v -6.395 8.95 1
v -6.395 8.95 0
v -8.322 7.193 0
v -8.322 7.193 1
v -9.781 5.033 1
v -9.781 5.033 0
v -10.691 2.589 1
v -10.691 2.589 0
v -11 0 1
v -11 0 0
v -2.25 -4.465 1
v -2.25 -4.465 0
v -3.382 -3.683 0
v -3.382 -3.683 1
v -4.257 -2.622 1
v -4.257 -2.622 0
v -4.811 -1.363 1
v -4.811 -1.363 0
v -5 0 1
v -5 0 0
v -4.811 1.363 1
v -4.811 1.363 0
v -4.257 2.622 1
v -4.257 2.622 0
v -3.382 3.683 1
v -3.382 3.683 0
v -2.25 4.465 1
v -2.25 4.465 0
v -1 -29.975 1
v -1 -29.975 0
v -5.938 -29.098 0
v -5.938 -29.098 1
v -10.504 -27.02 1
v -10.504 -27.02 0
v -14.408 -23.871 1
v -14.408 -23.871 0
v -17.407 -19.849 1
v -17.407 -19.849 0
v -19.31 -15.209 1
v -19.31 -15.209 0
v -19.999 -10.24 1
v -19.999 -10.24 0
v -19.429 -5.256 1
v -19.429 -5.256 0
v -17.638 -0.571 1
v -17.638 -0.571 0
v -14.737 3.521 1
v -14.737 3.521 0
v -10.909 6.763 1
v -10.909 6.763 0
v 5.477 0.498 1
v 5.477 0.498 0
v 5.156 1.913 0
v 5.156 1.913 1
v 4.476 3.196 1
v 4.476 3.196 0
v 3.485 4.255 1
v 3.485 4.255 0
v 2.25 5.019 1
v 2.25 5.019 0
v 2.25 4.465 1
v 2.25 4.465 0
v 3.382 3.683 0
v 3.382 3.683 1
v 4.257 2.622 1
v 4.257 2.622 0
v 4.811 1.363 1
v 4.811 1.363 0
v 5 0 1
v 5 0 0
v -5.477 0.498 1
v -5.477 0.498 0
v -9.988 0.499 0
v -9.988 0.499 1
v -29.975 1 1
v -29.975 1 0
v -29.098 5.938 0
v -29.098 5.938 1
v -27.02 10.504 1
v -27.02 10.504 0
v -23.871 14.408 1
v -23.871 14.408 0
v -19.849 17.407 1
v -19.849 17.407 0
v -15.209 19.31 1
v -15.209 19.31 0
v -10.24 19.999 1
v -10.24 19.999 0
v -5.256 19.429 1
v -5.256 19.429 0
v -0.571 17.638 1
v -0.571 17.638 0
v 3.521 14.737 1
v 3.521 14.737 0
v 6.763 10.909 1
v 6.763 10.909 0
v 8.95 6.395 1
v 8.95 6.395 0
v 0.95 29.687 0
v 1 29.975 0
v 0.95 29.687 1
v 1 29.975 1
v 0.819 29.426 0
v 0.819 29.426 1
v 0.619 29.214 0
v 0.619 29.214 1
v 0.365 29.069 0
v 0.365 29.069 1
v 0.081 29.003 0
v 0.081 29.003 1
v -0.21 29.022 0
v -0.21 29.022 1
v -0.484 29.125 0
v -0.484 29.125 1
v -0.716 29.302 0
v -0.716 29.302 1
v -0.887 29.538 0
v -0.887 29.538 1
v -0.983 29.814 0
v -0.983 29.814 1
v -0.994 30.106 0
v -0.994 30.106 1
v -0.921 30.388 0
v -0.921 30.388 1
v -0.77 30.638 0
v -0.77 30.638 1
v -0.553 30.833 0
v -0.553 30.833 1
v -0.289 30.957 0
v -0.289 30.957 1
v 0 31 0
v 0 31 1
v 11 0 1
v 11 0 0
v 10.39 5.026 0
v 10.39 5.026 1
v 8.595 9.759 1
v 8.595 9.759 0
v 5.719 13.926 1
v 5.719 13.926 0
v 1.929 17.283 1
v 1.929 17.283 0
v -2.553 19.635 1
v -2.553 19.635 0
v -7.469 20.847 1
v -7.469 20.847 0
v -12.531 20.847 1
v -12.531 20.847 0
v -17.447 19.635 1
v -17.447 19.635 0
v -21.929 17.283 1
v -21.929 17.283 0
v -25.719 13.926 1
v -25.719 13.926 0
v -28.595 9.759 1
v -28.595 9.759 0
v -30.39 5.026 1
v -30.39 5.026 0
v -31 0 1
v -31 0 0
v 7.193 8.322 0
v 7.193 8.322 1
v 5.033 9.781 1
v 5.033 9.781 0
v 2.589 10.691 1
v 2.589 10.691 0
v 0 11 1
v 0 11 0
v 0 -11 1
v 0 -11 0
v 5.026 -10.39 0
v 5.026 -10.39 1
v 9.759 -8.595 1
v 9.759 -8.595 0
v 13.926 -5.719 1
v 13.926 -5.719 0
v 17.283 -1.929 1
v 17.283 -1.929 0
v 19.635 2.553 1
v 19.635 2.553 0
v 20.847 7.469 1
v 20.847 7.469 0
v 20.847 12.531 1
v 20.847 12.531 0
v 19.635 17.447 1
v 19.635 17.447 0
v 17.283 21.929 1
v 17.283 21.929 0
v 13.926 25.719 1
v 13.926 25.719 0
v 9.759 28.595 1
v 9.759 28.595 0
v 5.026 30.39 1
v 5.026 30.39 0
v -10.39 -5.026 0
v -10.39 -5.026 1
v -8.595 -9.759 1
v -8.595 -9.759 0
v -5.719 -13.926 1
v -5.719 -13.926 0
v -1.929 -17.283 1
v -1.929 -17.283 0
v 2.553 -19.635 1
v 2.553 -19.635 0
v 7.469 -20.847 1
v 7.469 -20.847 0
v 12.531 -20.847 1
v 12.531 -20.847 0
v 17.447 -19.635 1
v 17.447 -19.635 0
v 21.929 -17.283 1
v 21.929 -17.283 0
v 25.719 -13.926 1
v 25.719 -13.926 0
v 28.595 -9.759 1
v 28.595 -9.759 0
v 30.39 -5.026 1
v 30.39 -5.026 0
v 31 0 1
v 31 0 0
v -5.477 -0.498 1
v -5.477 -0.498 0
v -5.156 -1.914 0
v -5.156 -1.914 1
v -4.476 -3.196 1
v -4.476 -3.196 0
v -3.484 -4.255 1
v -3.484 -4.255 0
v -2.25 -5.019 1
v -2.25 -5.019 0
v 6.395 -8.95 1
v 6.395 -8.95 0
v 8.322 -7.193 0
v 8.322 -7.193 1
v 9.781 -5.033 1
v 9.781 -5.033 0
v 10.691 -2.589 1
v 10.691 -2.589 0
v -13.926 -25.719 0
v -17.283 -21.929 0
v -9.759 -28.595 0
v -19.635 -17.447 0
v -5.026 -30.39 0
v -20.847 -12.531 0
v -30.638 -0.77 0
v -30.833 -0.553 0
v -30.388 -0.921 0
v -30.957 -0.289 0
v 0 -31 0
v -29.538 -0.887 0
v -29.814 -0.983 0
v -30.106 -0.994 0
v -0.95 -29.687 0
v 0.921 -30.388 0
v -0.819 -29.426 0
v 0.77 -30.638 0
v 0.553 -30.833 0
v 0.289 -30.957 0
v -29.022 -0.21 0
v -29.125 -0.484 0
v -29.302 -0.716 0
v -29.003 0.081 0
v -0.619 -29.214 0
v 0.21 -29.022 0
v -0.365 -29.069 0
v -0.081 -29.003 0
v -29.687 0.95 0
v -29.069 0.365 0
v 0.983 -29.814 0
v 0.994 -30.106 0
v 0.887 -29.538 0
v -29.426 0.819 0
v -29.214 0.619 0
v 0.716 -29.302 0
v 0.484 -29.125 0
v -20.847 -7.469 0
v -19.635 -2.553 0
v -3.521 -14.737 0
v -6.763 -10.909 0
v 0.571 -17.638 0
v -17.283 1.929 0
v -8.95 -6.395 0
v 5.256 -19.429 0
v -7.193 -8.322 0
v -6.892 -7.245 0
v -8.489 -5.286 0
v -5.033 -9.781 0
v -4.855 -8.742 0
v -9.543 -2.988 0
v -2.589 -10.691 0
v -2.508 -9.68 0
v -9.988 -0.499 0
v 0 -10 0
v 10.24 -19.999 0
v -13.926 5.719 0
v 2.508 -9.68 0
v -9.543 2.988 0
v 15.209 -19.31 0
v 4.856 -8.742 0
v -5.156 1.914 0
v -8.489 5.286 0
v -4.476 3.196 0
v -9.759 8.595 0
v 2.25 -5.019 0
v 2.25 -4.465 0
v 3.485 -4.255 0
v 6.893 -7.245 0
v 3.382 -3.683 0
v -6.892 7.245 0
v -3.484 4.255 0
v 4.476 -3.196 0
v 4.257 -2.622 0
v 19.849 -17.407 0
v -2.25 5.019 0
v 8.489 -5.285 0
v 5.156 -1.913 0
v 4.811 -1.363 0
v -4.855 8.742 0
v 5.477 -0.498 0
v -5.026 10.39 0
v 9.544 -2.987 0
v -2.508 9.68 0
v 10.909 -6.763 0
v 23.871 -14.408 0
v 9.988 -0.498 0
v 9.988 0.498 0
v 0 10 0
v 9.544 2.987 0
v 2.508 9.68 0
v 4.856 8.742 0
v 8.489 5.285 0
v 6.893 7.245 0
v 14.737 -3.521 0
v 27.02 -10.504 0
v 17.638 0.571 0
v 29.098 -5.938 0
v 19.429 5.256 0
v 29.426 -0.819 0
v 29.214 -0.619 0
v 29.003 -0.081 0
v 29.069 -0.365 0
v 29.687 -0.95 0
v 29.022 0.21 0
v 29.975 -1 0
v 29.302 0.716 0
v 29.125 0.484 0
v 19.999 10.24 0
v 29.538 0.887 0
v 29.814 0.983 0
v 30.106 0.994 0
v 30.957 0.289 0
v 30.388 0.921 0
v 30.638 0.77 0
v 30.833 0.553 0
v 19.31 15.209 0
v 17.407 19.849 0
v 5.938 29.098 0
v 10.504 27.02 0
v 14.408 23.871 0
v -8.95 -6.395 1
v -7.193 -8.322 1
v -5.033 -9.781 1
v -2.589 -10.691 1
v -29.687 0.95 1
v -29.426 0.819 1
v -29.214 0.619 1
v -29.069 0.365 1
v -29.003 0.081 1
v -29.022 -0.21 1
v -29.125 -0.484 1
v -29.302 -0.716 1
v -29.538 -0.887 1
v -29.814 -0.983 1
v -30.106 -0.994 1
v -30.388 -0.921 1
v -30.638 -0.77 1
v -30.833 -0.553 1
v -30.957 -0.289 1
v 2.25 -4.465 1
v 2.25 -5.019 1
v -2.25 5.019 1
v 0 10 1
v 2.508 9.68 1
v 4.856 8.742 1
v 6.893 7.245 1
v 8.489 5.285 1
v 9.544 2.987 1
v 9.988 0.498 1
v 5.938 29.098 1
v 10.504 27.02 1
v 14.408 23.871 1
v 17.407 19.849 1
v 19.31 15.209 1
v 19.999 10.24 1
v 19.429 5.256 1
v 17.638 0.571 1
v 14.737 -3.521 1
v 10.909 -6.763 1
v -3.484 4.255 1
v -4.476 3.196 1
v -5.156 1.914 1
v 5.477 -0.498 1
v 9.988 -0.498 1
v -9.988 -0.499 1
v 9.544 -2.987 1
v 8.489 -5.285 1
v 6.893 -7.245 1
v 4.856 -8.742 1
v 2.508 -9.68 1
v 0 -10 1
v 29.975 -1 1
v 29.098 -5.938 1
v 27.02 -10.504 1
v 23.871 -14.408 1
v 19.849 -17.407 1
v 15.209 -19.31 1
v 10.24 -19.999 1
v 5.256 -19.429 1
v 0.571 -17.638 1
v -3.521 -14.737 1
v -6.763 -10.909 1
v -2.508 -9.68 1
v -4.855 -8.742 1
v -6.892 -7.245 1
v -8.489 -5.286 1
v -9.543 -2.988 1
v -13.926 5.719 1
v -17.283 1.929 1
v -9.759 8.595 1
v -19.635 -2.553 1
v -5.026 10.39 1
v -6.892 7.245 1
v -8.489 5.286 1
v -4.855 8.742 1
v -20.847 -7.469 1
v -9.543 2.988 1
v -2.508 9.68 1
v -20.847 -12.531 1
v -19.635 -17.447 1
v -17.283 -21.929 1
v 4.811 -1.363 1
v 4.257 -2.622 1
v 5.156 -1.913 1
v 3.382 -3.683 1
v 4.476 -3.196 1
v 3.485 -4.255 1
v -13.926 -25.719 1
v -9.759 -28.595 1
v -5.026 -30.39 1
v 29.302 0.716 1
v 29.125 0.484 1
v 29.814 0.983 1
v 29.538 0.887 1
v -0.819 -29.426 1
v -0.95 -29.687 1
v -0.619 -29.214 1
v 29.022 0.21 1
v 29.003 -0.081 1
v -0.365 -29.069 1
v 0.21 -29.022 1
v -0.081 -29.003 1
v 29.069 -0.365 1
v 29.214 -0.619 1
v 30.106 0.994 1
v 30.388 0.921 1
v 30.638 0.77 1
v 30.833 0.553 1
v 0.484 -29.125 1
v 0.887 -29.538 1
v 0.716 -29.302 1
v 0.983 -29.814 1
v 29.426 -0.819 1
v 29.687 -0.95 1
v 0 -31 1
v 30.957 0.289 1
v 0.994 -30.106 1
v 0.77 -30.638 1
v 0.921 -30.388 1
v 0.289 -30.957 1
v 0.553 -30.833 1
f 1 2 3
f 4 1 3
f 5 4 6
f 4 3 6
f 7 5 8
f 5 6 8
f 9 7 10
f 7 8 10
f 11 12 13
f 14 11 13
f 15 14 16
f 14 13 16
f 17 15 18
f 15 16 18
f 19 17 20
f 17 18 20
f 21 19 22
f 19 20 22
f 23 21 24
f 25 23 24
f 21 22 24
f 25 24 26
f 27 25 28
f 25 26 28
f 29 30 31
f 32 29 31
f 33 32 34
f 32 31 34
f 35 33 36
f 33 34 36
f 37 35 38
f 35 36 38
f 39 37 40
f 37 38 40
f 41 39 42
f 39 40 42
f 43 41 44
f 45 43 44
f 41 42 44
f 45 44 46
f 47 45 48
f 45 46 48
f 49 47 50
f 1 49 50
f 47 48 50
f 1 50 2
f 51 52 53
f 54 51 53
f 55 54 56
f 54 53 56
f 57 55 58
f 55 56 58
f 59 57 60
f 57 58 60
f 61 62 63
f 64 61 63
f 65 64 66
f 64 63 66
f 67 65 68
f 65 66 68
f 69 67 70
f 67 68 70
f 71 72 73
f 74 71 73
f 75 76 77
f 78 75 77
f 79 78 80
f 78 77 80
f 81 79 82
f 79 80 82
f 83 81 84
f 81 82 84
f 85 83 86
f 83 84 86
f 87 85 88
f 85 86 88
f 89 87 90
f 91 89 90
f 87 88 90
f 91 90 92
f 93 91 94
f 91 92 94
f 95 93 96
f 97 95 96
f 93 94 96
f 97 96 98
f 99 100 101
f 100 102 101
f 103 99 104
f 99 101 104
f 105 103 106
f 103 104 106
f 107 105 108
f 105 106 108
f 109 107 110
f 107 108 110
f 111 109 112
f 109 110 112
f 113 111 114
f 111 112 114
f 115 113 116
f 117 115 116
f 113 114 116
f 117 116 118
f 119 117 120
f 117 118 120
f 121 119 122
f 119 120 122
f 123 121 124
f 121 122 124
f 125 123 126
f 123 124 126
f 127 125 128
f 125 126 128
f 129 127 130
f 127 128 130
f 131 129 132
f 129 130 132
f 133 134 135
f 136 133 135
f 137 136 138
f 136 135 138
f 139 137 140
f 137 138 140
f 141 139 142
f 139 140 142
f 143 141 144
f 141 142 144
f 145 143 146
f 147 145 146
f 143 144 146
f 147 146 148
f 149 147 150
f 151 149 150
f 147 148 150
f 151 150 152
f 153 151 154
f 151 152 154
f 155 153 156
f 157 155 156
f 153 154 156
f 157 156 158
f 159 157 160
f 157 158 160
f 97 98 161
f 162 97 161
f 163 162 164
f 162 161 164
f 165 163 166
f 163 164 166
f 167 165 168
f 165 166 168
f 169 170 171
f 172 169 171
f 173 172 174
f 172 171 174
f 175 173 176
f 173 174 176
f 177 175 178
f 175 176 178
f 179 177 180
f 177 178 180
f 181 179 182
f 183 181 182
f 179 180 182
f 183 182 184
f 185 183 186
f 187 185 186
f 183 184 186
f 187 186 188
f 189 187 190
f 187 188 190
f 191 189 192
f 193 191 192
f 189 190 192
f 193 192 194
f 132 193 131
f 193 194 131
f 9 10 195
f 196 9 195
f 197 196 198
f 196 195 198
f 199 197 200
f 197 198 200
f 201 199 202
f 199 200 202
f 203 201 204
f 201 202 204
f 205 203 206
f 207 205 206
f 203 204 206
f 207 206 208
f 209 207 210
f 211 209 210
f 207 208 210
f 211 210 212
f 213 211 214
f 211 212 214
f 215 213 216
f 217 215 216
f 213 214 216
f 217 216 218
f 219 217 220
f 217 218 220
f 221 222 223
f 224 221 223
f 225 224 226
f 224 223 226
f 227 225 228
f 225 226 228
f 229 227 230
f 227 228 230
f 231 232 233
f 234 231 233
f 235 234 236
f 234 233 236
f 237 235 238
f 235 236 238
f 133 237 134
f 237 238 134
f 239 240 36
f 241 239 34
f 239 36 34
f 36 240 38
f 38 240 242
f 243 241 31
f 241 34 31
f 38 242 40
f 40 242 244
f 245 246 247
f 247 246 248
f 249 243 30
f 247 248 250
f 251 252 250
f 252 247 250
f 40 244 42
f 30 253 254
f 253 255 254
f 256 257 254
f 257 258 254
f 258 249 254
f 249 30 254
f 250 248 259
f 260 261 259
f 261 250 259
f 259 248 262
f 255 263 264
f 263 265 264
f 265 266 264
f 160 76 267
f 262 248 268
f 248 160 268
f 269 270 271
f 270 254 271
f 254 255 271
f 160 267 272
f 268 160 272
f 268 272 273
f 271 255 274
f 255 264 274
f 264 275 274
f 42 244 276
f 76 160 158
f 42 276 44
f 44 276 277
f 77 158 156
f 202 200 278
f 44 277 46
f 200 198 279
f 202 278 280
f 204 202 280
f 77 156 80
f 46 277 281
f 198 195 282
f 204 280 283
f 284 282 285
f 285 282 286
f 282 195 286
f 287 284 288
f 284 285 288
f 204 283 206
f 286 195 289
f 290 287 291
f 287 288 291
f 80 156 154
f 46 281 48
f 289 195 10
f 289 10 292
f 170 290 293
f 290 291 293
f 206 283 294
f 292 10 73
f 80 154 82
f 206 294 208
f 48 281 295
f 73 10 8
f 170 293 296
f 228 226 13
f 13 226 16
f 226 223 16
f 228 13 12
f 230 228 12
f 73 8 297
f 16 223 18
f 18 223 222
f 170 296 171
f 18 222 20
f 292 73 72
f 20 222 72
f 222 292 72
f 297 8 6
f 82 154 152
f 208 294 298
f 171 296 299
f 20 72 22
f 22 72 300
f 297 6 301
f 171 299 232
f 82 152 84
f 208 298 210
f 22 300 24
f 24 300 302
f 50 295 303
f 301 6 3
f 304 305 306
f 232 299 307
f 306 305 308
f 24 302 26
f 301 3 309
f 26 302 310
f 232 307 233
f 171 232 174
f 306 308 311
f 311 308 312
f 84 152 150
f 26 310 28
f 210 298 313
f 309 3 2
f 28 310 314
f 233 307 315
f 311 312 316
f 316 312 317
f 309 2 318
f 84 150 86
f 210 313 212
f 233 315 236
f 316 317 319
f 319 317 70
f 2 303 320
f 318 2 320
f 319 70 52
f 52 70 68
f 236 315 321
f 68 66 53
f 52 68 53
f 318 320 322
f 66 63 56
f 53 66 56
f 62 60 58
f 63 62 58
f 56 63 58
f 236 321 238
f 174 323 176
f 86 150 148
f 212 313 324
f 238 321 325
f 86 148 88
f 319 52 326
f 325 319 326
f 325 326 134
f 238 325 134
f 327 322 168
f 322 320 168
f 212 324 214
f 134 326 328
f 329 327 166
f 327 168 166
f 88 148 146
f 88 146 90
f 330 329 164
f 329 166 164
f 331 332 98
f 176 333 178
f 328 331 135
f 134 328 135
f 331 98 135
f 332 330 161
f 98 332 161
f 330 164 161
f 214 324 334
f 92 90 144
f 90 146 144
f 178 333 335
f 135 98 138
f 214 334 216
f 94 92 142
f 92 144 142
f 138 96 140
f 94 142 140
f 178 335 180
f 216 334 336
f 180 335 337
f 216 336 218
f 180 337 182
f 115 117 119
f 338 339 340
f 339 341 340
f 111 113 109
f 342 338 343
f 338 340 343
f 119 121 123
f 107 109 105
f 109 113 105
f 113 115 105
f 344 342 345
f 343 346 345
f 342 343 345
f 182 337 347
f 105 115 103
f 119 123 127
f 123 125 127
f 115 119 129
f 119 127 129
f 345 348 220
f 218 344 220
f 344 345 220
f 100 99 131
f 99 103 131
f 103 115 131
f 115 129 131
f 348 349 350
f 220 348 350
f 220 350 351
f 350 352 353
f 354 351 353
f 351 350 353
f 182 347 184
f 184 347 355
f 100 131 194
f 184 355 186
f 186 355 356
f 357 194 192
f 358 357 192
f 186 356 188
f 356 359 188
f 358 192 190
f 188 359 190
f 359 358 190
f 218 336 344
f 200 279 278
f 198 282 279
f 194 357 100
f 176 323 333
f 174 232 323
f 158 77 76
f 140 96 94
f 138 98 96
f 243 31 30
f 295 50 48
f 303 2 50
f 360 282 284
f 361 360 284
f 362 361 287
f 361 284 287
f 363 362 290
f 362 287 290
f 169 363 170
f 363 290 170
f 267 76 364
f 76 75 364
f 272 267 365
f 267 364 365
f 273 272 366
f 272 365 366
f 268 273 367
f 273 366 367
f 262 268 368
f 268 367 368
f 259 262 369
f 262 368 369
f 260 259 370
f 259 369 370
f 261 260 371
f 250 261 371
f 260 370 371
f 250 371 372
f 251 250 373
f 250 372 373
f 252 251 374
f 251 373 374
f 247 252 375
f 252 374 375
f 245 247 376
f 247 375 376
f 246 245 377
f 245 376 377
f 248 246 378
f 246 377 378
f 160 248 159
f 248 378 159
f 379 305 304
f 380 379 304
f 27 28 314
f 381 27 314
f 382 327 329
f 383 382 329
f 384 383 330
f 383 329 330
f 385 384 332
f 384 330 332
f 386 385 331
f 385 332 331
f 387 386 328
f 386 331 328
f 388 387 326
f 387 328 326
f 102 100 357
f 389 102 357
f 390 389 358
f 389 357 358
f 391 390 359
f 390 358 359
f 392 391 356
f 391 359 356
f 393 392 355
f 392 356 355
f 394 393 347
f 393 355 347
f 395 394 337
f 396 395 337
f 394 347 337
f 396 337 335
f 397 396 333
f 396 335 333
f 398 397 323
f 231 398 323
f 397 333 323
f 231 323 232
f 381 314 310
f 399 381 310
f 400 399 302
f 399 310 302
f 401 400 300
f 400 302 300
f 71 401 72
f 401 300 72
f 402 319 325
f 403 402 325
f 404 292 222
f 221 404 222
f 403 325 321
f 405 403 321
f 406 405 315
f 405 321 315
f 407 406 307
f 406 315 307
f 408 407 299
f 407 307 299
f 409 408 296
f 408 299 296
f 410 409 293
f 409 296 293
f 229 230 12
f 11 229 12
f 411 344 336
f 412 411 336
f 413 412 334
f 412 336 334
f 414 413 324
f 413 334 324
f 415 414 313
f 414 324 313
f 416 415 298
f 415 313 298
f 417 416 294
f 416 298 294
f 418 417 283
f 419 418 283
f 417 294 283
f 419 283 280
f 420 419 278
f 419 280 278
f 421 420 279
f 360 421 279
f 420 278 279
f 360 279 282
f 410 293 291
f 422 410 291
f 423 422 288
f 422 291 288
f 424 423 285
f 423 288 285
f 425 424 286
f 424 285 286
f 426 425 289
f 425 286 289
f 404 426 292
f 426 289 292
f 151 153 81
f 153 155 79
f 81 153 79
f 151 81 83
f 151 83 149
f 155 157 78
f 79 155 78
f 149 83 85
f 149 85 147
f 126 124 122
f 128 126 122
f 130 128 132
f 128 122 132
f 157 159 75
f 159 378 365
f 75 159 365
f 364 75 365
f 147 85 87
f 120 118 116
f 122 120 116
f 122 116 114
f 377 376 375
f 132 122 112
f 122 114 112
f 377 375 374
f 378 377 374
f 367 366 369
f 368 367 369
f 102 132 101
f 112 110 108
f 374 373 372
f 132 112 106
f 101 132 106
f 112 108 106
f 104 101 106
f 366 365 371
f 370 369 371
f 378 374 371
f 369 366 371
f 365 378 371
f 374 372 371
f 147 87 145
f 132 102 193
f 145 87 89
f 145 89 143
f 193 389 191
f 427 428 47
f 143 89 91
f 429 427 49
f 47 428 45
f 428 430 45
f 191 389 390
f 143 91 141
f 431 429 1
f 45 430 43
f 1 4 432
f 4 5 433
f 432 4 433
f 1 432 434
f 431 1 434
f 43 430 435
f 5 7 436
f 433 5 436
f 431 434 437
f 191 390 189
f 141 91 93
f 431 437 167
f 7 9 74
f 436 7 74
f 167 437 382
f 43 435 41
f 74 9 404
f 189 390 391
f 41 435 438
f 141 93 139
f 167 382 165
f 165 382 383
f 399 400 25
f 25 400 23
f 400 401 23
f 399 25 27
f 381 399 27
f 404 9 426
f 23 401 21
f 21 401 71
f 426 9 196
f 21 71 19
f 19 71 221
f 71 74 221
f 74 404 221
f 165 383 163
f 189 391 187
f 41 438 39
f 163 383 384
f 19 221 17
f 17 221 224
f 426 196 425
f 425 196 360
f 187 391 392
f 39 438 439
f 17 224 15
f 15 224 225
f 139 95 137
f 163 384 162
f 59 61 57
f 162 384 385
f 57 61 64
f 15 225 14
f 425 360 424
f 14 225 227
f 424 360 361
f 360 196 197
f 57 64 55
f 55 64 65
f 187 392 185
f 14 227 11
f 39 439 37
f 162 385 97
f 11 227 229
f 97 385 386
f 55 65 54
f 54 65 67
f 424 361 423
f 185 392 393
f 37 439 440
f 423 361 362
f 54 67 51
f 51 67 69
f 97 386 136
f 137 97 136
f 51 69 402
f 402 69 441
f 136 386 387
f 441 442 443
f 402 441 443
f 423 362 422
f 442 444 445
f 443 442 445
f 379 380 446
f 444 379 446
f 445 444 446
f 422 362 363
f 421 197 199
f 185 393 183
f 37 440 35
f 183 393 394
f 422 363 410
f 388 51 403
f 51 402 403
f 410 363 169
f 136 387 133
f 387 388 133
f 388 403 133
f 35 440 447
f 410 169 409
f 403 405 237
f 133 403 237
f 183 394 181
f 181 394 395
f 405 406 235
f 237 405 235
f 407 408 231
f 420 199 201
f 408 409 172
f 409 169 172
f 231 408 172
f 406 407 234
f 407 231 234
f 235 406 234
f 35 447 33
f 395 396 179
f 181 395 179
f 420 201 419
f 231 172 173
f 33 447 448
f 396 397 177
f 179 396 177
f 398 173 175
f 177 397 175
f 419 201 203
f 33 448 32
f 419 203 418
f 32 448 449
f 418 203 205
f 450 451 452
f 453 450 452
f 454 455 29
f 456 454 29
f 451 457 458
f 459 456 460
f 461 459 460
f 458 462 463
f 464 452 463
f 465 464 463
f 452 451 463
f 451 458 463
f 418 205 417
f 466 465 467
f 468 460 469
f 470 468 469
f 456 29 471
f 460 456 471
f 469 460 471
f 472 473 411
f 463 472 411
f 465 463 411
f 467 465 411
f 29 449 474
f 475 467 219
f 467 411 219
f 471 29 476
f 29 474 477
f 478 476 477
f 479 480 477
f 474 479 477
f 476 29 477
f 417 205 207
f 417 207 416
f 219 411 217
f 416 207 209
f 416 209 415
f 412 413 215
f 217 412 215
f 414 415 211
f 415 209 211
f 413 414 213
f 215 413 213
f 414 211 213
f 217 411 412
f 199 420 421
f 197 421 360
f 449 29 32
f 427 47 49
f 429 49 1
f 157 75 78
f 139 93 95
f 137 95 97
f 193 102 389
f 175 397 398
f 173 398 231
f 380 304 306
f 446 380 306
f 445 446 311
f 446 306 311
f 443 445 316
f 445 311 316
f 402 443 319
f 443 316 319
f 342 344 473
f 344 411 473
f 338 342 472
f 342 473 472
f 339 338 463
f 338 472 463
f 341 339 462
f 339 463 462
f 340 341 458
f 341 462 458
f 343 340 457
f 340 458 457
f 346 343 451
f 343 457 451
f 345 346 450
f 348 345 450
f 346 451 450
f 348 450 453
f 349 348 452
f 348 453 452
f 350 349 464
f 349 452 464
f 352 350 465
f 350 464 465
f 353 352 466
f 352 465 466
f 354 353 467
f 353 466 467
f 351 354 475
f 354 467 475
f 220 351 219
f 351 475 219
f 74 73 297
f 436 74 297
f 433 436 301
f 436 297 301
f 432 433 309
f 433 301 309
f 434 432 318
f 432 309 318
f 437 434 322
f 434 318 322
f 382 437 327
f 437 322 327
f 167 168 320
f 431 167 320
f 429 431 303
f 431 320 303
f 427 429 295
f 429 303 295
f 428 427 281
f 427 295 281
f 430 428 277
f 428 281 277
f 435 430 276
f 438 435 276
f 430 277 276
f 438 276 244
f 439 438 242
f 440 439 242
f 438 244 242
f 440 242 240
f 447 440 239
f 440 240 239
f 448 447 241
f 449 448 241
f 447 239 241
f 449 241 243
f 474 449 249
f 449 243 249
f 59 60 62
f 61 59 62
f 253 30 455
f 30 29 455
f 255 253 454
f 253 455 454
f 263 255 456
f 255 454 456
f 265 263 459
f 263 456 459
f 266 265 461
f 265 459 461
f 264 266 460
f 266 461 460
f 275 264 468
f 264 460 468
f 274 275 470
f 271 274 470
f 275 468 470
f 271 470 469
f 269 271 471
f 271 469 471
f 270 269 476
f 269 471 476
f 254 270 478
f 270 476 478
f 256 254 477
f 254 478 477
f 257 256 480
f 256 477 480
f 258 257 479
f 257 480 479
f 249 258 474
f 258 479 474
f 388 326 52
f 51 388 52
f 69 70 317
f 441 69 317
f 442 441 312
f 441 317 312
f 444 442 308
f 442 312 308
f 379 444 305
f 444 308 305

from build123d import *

# Parameters (mm, degrees)
F1_DEPTH   = 1
F1_FACE_W  = 1
F1_FACE_H  = 1
F1_FACE1_W = 1
F1_FACE1_H = 1
F1_FACE2_W = 1
F1_FACE2_H = 1
F1_FACE3_W = 1
F1_FACE3_H = 1


# Not quite as in the source:
# - a feature names something its author has since deleted; it is built from what else it names


with BuildPart() as f1:
    # F0 (on Top) → F1 (new body)
    with BuildSketch(Plane.XY):
        with BuildLine():
            ThreePointArc((8.95, 6.3951153234), (9.735754356, 3.2403703492), (10, 0))
            ThreePointArc((10, 0), (9.9968982101, -0.2490505519), (9.9875947645, -0.4979466032))
            ThreePointArc((9.9875947645, -0.4979466032), (6.8927691811, -7.2449798493), (0, -10))
            ThreePointArc((0, -10), (3.2403703492, -9.735754356), (6.3951153234, -8.95))
            ThreePointArc((6.3951153234, -8.95), (9.7812644519, -5.0325804237), (11, 0))
            ThreePointArc((11, 0), (10.474970167, 3.3578266781), (8.95, 6.3951153234))
        make_face()
        with BuildLine():
            ThreePointArc((9.9875947645, 0.4979466032), (9.9968982101, 0.2490505519), (10, 0))
            ThreePointArc((10, 0), (9.735754356, 3.2403703492), (8.95, 6.3951153234))
            ThreePointArc((8.95, 6.3951153234), (5.0325804237, 9.7812644519), (0, 11))
            ThreePointArc((0, 11), (-3.3578266781, 10.474970167), (-6.3951153234, 8.95))
            ThreePointArc((-6.3951153234, 8.95), (-3.2403703492, 9.735754356), (0, 10))
            ThreePointArc((0, 10), (6.8927691811, 7.2449798493), (9.9875947645, 0.4979466032))
        make_face()
        with BuildLine():
            ThreePointArc((-30, 0), (-13.2403703492, 19.735754356), (8.95, 6.3951153234))
            ThreePointArc((8.95, 6.3951153234), (10.474970167, 3.3578266781), (11, 0))
            ThreePointArc((11, 0), (-10, 21), (-31, 0))
            Line((-31, 0), (-30, 0))
        make_face()
        with BuildLine():
            ThreePointArc((-9.9875233888, 0.4993761694), (-6.8922506595, 7.2454731279), (0, 10))
            ThreePointArc((0, 10), (-3.2403703492, 9.735754356), (-6.3951153234, 8.95))
            ThreePointArc((-6.3951153234, 8.95), (-9.7812644519, 5.0325804237), (-11, 0))
            ThreePointArc((-11, 0), (-10.474970167, -3.3578266781), (-8.95, -6.3951153234))
            ThreePointArc((-8.95, -6.3951153234), (-9.735754356, -3.2403703492), (-10, 0))
            ThreePointArc((-10, 0), (-9.9968803606, 0.2497660027), (-9.9875233888, 0.4993761694))
        make_face()
        with BuildLine():
            ThreePointArc((6.3951153234, -8.95), (3.2403703492, -9.735754356), (0, -10))
            ThreePointArc((0, -10), (-6.8922506595, -7.2454731279), (-9.9875233888, -0.4993761694))
            ThreePointArc((-9.9875233888, -0.4993761694), (-9.9968803606, -0.2497660027), (-10, 0))
            ThreePointArc((-10, 0), (-9.735754356, -3.2403703492), (-8.95, -6.3951153234))
            ThreePointArc((-8.95, -6.3951153234), (-5.0325804237, -9.7812644519), (0, -11))
            ThreePointArc((0, -11), (3.3578266781, -10.474970167), (6.3951153234, -8.95))
        make_face()
        with BuildLine():
            ThreePointArc((-6.3951153234, 8.95), (-3.3578266781, 10.474970167), (0, 11))
            ThreePointArc((0, 11), (-21, -10), (0, -31))
            Line((0, -31), (0, -30))
            ThreePointArc((0, -30), (-19.735754356, -13.2403703492), (-6.3951153234, 8.95))
        make_face()
        with BuildLine():
            ThreePointArc((0, 30), (19.735754356, 13.2403703492), (6.3951153234, -8.95))
            ThreePointArc((6.3951153234, -8.95), (3.3578266781, -10.474970167), (0, -11))
            ThreePointArc((0, -11), (21, 10), (0, 31))
            Line((0, 31), (0, 30))
        make_face()
        with BuildLine():
            ThreePointArc((-8.95, -6.3951153234), (-10.474970167, -3.3578266781), (-11, 0))
            ThreePointArc((-11, 0), (10, -21), (31, 0))
            Line((31, 0), (30, 0))
            ThreePointArc((30, 0), (13.2403703492, -19.735754356), (-8.95, -6.3951153234))
        make_face()
        with BuildLine():
            ThreePointArc((5.5, 0), (5.4943502571, 0.2492293164), (5.4774126356, 0.4979466032))
            ThreePointArc((5.4774126356, 0.4979466032), (4.4763336759, 3.1956903514), (2.25, 5.018714975))
            Line((2.25, 5.018714975), (2.25, 4.4651427749))
            ThreePointArc((2.25, 4.4651427749), (4.2573465915, 2.6220221204), (5, 0))
            ThreePointArc((5, 0), (4.2573465915, -2.6220221204), (2.25, -4.4651427749))
            Line((2.25, -4.4651427749), (2.25, -5.018714975))
            ThreePointArc((2.25, -5.018714975), (4.4763336759, -3.1956903514), (5.4774126356, -0.4979466032))
            ThreePointArc((5.4774126356, -0.4979466032), (5.4943502571, -0.2492293164), (5.5, 0))
        make_face()
        with BuildLine():
            ThreePointArc((9.9875947645, -0.4979466032), (9.9968982101, -0.2490505519), (10, 0))
            ThreePointArc((10, 0), (9.9968982101, 0.2490505519), (9.9875947645, 0.4979466032))
            Line((9.9875947645, 0.4979466032), (5.4774126356, 0.4979466032))
            ThreePointArc((5.4774126356, 0.4979466032), (5.4943502571, 0.2492293164), (5.5, 0))
            ThreePointArc((5.5, 0), (5.4943502571, -0.2492293164), (5.4774126356, -0.4979466032))
            Line((5.4774126356, -0.4979466032), (9.9875947645, -0.4979466032))
        make_face()
        with BuildLine():
            ThreePointArc((-2.25, 5.018714975), (-4.4761862714, 3.1958968168), (-5.4773666772, 0.4984518873))
            ThreePointArc((-5.4773666772, 0.4984518873), (-5.5, 0), (-5.4773666772, -0.4984518873))
            ThreePointArc((-5.4773666772, -0.4984518873), (-4.4761862714, -3.1958968168), (-2.25, -5.018714975))
            Line((-2.25, -5.018714975), (-2.25, -4.4651427749))
            ThreePointArc((-2.25, -4.4651427749), (-5, 0), (-2.25, 4.4651427749))
            Line((-2.25, 4.4651427749), (-2.25, 5.018714975))
        make_face()
        with BuildLine():
            Line((-5.4773666772, 0.4984518873), (-9.9875233888, 0.4993761694))
            ThreePointArc((-9.9875233888, 0.4993761694), (-9.9968803606, 0.2497660027), (-10, 0))
            ThreePointArc((-10, 0), (-9.9968803606, -0.2497660027), (-9.9875233888, -0.4993761694))
            Line((-9.9875233888, -0.4993761694), (-5.4773666772, -0.4984518873))
            ThreePointArc((-5.4773666772, -0.4984518873), (-5.5, 0), (-5.4773666772, 0.4984518873))
        make_face()
    extrude(amount=F1_DEPTH)

    # F1_face (on face) → F2 (revolve)
    with BuildSketch(Plane(origin=(-30.5, 0, 0.5), x_dir=(1, 0, 0), z_dir=(0, -1, 0))):
        Rectangle(F1_FACE_W, F1_FACE_H)
    revolve(axis=Axis((-30, 0, 0.5), (0, 0, -1)))

    # F1_face1 (on face) → F3 (revolve)
    with BuildSketch(Plane(origin=(0, -30.5, 0.5), x_dir=(0, 1, 0), z_dir=(1, 0, 0))):
        Rectangle(F1_FACE1_W, F1_FACE1_H)
    revolve(axis=Axis((0, -30, 0.5), (0, 0, -1)))

    # F1_face2 (on face) → F4 (revolve)
    with BuildSketch(Plane(origin=(30.5, 0, 0.5), x_dir=(-1, 0, 0), z_dir=(0, 1, 0))):
        Rectangle(F1_FACE2_W, F1_FACE2_H)
    revolve(axis=Axis((30, 0, 0.5), (0, 0, -1)))

    # F1_face3 (on face) → F5 (revolve)
    with BuildSketch(Plane(origin=(0, 30.5, 0.5), x_dir=(0, -1, 0), z_dir=(-1, 0, 0))):
        Rectangle(F1_FACE3_W, F1_FACE3_H)
    revolve(axis=Axis((0, 30, 0.5), (0, 0, -1)))


solid = f1.part
